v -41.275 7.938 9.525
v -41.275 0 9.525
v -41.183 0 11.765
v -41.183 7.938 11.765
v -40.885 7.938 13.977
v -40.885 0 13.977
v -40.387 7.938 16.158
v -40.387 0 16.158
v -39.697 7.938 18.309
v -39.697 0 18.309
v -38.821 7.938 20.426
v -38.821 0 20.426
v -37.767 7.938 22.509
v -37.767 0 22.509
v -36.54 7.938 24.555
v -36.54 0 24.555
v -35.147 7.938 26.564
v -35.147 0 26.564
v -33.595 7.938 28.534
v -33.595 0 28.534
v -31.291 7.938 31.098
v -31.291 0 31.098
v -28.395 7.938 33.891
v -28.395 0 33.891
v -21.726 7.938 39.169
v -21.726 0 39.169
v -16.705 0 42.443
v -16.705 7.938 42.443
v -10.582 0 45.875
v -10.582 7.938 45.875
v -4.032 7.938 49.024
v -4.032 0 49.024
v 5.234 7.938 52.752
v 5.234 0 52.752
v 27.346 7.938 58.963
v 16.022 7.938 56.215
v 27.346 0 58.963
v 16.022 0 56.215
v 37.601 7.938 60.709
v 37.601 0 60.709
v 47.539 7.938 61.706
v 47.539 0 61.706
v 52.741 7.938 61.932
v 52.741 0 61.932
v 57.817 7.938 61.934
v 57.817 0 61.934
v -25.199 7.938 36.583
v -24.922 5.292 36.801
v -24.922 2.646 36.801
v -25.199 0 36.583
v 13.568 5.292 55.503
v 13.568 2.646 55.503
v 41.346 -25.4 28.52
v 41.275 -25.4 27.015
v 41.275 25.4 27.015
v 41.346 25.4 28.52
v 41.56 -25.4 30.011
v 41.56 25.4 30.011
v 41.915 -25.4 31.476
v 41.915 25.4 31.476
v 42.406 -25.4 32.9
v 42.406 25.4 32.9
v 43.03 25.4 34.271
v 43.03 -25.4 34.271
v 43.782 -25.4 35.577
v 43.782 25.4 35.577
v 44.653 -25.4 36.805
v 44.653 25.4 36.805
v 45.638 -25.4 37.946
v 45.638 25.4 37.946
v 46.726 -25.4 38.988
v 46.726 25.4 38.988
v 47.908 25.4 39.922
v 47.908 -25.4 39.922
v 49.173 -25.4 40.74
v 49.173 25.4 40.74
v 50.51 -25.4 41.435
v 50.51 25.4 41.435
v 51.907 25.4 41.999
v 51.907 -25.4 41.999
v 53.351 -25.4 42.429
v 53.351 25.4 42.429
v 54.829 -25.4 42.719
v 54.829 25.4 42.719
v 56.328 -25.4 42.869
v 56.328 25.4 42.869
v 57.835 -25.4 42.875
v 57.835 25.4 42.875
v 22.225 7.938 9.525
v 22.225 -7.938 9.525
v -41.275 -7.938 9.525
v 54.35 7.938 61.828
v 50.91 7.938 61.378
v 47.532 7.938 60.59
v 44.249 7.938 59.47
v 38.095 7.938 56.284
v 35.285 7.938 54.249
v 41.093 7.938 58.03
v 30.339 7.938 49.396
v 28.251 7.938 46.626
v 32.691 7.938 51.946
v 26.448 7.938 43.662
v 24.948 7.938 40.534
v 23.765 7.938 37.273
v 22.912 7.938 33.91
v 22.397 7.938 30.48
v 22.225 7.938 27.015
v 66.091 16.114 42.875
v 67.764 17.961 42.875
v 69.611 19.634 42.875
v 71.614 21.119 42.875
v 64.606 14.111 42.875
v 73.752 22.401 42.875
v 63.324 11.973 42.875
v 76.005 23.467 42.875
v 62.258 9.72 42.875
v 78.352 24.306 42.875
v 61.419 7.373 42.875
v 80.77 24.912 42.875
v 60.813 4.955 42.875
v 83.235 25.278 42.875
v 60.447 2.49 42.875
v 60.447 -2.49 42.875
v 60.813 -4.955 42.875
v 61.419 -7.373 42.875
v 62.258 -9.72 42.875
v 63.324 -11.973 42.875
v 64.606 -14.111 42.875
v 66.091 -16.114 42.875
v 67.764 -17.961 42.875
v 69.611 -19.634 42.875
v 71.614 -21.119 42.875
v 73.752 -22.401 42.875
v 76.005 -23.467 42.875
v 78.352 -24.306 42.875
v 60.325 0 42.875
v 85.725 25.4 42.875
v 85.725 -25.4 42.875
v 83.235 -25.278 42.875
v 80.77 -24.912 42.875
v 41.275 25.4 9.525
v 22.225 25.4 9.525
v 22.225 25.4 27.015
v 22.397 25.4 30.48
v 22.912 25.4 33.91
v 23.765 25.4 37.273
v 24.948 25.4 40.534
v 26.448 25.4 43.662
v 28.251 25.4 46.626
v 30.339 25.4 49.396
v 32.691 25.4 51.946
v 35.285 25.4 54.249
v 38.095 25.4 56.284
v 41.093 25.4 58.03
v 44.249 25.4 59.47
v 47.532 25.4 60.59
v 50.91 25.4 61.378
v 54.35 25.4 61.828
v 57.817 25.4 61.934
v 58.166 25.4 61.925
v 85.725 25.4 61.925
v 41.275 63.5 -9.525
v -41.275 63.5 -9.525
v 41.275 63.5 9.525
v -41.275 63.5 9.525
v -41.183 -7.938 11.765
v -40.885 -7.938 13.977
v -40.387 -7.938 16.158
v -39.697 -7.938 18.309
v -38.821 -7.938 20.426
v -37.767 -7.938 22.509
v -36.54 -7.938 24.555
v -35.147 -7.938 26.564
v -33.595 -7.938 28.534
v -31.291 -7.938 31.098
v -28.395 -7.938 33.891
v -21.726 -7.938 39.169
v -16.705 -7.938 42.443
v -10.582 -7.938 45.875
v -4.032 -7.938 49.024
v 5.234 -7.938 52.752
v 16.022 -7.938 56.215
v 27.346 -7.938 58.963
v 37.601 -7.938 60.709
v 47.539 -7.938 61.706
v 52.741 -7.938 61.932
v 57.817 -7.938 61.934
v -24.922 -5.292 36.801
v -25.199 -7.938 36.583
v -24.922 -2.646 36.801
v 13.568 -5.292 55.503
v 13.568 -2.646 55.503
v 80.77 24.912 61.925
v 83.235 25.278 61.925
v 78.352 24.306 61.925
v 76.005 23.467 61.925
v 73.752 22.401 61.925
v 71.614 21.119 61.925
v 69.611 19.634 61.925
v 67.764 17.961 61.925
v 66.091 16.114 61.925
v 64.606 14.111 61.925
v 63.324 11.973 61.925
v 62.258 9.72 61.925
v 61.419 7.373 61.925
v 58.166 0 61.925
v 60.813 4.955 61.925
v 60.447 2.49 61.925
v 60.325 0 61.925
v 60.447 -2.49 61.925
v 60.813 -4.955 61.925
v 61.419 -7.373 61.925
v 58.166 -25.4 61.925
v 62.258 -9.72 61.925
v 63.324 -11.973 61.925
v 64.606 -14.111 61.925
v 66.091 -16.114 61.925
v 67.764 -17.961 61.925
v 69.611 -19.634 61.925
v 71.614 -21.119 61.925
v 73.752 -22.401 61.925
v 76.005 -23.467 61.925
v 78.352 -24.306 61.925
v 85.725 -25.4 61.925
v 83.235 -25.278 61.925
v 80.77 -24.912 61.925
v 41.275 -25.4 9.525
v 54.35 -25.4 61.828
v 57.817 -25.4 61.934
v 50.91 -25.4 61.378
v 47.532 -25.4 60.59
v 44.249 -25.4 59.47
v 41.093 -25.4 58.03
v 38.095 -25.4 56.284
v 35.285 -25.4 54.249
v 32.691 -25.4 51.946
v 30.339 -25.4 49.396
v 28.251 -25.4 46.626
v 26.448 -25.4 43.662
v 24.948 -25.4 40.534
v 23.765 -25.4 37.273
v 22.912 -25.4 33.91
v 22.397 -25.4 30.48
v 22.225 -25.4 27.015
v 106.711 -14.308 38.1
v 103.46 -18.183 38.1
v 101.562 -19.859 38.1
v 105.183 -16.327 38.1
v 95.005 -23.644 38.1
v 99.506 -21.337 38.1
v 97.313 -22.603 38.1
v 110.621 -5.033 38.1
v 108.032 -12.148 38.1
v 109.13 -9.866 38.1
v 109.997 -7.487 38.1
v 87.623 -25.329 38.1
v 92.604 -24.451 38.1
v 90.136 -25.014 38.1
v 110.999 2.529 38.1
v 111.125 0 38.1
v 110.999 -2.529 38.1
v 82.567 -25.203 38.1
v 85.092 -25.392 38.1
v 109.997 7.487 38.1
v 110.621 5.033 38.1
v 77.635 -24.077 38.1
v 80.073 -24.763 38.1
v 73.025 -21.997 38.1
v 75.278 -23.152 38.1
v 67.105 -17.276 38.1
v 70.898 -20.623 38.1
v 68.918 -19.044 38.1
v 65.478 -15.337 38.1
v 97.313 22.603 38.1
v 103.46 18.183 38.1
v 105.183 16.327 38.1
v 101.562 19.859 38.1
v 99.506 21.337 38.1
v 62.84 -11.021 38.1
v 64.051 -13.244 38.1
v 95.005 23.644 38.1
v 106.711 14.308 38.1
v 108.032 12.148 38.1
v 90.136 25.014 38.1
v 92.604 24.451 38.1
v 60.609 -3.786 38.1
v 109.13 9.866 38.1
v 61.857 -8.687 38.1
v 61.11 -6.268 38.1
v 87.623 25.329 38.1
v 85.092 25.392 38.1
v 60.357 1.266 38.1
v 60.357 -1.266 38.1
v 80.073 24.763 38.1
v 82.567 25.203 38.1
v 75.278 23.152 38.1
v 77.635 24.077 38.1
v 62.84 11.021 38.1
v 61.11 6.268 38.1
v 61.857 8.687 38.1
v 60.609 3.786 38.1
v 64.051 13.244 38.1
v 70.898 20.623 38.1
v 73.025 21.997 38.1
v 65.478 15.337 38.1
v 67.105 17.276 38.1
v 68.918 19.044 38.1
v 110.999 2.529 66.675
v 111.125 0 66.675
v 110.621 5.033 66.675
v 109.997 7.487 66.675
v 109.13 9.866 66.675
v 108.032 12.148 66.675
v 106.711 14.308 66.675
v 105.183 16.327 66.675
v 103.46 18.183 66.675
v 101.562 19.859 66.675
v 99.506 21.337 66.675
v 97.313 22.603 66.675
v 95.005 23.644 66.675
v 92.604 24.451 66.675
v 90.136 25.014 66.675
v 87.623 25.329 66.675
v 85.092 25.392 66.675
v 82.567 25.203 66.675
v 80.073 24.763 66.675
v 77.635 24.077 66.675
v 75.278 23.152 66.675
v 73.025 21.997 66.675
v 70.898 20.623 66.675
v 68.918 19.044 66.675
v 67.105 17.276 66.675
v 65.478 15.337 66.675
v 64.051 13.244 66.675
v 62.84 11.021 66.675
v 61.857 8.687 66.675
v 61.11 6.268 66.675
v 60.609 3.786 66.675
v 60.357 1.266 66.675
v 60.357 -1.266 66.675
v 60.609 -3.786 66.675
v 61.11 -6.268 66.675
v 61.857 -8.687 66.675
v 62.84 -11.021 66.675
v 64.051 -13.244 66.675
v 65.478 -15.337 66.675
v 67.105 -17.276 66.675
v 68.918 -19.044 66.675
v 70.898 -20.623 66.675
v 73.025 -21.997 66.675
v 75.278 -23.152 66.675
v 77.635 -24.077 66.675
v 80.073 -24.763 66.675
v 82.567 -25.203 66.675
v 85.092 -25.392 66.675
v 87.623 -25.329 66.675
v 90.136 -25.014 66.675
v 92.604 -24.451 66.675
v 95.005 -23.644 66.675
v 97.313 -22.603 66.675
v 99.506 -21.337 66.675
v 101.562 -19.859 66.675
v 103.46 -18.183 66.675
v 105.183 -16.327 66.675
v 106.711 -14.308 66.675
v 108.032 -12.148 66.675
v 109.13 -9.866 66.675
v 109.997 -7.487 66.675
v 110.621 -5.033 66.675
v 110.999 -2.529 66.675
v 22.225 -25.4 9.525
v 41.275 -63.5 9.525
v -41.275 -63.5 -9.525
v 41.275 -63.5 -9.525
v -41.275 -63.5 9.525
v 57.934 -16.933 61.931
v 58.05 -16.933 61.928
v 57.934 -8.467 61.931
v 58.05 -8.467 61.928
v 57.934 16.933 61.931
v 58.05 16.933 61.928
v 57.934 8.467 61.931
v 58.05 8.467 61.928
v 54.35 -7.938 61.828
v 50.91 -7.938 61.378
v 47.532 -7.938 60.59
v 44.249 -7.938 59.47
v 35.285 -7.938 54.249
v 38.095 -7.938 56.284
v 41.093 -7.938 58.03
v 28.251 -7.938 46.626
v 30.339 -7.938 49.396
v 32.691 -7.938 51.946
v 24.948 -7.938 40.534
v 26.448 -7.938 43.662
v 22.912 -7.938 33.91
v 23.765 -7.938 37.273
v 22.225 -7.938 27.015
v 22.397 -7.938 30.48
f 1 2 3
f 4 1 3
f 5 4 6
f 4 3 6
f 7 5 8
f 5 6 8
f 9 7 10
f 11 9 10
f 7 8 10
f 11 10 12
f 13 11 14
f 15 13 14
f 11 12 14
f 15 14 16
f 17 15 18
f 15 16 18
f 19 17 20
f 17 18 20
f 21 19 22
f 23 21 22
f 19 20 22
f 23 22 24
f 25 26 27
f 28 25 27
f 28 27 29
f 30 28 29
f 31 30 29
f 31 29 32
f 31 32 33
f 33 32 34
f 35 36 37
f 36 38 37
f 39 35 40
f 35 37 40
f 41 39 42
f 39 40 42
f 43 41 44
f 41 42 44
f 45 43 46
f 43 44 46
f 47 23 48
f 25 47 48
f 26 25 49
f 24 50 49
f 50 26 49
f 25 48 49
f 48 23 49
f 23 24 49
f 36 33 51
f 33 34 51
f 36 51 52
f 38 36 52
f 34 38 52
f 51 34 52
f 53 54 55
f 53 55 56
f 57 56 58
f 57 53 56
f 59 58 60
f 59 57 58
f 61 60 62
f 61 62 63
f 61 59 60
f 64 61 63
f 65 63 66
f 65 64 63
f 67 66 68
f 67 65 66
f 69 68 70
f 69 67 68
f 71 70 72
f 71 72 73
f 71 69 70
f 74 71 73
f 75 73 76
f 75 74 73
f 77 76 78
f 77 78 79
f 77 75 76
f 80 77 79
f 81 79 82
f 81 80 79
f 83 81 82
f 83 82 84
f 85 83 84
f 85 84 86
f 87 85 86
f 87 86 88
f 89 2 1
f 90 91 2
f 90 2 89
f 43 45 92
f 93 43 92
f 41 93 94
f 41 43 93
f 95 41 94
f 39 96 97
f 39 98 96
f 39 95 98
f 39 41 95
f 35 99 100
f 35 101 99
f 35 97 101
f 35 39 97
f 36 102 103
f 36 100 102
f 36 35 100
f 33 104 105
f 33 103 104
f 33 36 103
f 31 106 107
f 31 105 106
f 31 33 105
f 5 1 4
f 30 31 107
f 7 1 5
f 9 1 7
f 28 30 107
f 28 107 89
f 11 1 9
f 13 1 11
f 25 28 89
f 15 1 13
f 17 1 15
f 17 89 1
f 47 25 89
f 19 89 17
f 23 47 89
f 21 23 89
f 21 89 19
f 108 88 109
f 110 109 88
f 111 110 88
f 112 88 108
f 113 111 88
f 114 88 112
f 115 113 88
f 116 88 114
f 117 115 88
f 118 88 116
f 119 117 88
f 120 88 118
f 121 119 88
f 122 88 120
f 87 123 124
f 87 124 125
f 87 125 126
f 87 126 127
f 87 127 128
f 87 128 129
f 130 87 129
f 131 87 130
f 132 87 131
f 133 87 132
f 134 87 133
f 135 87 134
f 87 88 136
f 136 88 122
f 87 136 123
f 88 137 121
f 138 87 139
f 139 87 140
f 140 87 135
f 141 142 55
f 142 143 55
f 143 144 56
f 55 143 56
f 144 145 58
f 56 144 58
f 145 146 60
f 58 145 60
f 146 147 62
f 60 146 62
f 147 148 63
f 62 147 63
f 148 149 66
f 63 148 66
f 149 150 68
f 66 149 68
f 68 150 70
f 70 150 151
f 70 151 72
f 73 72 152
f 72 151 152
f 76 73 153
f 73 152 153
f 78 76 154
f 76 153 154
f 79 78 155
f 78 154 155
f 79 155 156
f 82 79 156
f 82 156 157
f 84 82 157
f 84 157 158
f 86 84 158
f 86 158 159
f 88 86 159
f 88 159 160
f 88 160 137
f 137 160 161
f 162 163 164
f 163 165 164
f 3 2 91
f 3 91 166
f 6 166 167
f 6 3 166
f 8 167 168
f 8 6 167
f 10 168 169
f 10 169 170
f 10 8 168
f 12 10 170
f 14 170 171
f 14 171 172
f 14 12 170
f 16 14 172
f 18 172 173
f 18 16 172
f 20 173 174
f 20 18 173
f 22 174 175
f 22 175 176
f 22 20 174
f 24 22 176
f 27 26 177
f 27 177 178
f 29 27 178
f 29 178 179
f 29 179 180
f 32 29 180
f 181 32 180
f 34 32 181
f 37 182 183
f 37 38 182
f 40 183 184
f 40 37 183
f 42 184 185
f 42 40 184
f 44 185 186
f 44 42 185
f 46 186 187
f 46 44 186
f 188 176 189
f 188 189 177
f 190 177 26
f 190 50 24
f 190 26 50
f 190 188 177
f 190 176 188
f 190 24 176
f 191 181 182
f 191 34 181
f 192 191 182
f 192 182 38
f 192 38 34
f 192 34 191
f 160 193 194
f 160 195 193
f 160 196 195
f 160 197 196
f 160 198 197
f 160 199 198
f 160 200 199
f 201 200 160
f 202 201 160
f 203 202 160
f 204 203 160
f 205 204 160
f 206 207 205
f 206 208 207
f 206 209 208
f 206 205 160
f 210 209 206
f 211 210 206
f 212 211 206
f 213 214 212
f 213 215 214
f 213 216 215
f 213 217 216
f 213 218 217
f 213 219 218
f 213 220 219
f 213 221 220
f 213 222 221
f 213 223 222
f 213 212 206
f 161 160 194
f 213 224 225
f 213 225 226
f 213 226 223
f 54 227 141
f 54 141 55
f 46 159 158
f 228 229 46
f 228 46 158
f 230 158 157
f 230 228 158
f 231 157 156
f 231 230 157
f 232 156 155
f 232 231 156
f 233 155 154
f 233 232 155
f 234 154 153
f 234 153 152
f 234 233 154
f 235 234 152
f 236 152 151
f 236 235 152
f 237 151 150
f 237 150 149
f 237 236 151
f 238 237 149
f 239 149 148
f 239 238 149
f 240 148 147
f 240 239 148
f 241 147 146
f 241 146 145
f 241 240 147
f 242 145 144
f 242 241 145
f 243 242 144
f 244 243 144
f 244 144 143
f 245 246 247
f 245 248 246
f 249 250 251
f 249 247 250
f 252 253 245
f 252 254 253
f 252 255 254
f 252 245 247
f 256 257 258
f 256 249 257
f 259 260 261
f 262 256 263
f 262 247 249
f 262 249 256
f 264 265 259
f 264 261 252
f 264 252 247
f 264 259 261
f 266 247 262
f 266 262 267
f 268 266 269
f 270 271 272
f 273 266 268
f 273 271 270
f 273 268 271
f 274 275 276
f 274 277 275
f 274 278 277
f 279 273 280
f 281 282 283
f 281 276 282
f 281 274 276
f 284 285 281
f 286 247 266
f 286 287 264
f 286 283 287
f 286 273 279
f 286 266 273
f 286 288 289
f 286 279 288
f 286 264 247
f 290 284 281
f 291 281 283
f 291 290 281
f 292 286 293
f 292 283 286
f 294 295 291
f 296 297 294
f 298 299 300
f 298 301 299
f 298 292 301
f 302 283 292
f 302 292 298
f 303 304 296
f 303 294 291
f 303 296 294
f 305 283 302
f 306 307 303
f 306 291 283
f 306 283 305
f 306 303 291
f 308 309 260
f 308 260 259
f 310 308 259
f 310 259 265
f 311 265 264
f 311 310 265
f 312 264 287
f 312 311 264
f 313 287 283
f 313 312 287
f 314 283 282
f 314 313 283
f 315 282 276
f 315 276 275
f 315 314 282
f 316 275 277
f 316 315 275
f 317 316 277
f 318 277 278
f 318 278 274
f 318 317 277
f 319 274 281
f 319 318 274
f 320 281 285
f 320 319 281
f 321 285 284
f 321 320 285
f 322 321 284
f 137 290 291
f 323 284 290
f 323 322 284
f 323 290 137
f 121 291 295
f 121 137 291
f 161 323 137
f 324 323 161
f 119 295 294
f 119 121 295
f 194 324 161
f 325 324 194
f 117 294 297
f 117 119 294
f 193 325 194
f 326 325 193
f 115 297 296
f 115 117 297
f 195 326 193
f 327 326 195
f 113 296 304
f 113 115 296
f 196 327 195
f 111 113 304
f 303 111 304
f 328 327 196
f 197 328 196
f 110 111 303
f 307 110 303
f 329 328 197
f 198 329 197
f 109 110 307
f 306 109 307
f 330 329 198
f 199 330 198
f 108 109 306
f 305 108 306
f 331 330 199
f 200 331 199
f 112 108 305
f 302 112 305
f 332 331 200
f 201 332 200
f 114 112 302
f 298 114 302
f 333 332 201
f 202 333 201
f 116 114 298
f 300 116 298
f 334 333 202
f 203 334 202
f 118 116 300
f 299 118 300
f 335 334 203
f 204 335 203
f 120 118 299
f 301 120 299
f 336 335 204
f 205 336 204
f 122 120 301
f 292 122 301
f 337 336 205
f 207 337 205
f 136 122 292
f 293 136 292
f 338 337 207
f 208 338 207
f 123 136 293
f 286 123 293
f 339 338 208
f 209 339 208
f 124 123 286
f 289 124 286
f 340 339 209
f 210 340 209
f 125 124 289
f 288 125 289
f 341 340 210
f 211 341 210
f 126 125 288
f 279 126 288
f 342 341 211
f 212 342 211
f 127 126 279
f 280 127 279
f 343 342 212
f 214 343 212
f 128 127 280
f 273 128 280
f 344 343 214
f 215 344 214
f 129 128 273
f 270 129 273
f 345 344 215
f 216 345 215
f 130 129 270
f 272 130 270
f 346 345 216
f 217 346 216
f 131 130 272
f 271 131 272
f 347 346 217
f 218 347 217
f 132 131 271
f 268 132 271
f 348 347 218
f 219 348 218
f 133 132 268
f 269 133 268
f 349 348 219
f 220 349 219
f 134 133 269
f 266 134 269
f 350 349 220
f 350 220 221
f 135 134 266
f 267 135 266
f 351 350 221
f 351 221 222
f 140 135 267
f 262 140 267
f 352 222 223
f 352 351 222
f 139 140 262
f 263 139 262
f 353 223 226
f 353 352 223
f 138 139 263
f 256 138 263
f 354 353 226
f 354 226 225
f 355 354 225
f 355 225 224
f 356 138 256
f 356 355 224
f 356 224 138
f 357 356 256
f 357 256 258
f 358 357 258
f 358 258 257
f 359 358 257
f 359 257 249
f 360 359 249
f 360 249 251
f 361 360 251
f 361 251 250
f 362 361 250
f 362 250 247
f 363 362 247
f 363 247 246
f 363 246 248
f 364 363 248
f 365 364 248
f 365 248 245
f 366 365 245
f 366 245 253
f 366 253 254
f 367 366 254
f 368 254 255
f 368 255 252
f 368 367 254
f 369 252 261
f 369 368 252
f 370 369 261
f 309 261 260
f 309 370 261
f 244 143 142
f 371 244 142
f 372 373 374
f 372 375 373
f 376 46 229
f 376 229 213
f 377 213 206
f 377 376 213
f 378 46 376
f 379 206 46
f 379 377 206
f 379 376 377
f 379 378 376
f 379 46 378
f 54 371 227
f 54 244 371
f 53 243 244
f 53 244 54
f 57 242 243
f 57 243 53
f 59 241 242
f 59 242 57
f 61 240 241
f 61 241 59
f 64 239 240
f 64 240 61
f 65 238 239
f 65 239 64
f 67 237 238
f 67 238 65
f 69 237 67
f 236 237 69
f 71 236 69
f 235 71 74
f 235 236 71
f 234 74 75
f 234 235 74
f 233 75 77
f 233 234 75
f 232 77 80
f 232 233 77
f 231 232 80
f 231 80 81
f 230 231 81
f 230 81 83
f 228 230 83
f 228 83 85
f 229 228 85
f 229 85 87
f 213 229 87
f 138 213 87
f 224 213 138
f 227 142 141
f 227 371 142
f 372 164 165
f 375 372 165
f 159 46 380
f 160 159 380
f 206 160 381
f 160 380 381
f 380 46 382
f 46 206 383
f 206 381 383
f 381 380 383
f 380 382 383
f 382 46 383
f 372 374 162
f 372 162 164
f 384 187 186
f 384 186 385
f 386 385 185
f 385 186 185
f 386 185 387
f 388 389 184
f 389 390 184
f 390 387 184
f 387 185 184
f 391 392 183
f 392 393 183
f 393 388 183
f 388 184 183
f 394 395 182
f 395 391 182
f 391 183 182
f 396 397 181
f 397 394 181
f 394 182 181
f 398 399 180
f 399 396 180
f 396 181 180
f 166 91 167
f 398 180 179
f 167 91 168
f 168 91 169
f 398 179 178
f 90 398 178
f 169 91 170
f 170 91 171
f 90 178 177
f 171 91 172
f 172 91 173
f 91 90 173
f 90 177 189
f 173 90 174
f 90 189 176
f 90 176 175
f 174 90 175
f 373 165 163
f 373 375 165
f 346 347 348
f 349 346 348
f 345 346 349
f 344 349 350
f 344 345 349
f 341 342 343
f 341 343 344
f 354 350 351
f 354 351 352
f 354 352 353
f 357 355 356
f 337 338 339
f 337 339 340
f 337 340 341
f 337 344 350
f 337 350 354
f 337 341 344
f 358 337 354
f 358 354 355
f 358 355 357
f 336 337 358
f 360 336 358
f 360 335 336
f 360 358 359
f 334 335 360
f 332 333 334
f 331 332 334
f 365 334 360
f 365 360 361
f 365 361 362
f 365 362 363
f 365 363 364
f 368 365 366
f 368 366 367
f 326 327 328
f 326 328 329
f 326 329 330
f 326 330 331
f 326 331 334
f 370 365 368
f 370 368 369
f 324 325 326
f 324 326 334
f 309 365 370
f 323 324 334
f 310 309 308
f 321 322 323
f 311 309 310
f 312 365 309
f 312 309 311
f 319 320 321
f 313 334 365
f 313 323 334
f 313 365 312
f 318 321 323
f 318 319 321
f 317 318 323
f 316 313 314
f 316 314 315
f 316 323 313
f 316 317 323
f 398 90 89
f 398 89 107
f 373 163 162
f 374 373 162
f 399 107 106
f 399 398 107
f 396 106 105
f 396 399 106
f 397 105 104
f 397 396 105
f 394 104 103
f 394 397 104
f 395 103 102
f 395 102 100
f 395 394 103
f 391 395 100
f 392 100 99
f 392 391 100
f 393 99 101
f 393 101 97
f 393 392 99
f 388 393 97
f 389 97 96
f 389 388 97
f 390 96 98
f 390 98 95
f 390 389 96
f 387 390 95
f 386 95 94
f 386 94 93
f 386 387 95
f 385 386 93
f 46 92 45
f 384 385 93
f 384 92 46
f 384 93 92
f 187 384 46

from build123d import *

# Parameters (mm, degrees)
F1_DEPTH = 63.5
F0_W     = 25.4
F0_H     = 19.05
F2_DEPTH = 25.4
F3_DEPTH = 7.9375


with BuildPart() as f1:
    # F0 (on Front) → F1 (new body, symmetric)
    with BuildSketch(Plane.XZ):
        Polygon((-41.275, -9.525), (41.275, -9.525), (41.275, 9.525), (22.225, 9.525), (-41.275, 9.525), align=None)
    extrude(amount=F1_DEPTH, both=True)


with BuildPart() as f2:
    # F0 (on Front) → F2 (new body, symmetric)
    with BuildSketch(Plane.XZ):
        with BuildLine():
            Line((22.225, 9.525), (41.275, 9.525))
            Line((41.275, 9.525), (41.275, 27.0149824788))
            ThreePointArc((41.275, 27.0149824788), (46.1695080545, 38.479903832), (57.834927135, 42.8752))
            Line((57.834927135, 42.8752), (60.325, 42.8752))
            Line((60.325, 42.8752), (60.325, 61.9252))
            Line((60.325, 61.9252), (58.1660401678, 61.9252))
            add(Edge.make_bspline(
                [(57.8174638201, 61.9336038297), (57.9337805874, 61.9309893035), (58.0499732377, 61.9281881475), (58.1660401678, 61.9252)],
                knots=[112.0895183663, 112.0895183663, 112.0895183663, 112.0895183663, 112.4024084693, 112.4024084693, 112.4024084693, 112.4024084693], degree=3))
            ThreePointArc((57.8174638201, 61.9336038297), (32.6914181617, 51.9455540619), (22.225, 27.0149824788))
            Line((22.225, 27.0149824788), (22.225, 9.525))
        make_face()
        with Locations((73.025, 52.4002)):
            Rectangle(F0_W, F0_H)
    extrude(amount=F2_DEPTH, both=True)

    # F0 (on Front) → F4 (revolve)
    with BuildSketch(Plane.XZ):
        Polygon((85.725, 61.9252), (85.725, 42.8752), (85.725, 38.1), (111.125, 38.1), (111.125, 66.675), (85.725, 66.675), align=None)
    revolve(axis=Axis((85.725, 0, 52.3875), (0, 0, 1)))


with BuildPart() as f3:
    # F0 (on Front) → F3 (new body, symmetric)
    with BuildSketch(Plane.XZ):
        with BuildLine():
            add(Edge.make_bspline(
                [(-41.275, 9.525), (-41.4496070283, 39.8556577568), (16.1482313953, 62.8702297587), (57.8174638201, 61.9336038297)],
                knots=[0, 0, 0, 0, 112.0895183663, 112.0895183663, 112.0895183663, 112.0895183663], degree=3))
            Line((-41.275, 9.525), (22.225, 9.525))
            Line((22.225, 9.525), (22.225, 27.0149824788))
            ThreePointArc((22.225, 27.0149824788), (32.6914181617, 51.9455540619), (57.8174638201, 61.9336038297))
        make_face()
    extrude(amount=F3_DEPTH, both=True)


solid = Compound([f1.part, f2.part, f3.part])
